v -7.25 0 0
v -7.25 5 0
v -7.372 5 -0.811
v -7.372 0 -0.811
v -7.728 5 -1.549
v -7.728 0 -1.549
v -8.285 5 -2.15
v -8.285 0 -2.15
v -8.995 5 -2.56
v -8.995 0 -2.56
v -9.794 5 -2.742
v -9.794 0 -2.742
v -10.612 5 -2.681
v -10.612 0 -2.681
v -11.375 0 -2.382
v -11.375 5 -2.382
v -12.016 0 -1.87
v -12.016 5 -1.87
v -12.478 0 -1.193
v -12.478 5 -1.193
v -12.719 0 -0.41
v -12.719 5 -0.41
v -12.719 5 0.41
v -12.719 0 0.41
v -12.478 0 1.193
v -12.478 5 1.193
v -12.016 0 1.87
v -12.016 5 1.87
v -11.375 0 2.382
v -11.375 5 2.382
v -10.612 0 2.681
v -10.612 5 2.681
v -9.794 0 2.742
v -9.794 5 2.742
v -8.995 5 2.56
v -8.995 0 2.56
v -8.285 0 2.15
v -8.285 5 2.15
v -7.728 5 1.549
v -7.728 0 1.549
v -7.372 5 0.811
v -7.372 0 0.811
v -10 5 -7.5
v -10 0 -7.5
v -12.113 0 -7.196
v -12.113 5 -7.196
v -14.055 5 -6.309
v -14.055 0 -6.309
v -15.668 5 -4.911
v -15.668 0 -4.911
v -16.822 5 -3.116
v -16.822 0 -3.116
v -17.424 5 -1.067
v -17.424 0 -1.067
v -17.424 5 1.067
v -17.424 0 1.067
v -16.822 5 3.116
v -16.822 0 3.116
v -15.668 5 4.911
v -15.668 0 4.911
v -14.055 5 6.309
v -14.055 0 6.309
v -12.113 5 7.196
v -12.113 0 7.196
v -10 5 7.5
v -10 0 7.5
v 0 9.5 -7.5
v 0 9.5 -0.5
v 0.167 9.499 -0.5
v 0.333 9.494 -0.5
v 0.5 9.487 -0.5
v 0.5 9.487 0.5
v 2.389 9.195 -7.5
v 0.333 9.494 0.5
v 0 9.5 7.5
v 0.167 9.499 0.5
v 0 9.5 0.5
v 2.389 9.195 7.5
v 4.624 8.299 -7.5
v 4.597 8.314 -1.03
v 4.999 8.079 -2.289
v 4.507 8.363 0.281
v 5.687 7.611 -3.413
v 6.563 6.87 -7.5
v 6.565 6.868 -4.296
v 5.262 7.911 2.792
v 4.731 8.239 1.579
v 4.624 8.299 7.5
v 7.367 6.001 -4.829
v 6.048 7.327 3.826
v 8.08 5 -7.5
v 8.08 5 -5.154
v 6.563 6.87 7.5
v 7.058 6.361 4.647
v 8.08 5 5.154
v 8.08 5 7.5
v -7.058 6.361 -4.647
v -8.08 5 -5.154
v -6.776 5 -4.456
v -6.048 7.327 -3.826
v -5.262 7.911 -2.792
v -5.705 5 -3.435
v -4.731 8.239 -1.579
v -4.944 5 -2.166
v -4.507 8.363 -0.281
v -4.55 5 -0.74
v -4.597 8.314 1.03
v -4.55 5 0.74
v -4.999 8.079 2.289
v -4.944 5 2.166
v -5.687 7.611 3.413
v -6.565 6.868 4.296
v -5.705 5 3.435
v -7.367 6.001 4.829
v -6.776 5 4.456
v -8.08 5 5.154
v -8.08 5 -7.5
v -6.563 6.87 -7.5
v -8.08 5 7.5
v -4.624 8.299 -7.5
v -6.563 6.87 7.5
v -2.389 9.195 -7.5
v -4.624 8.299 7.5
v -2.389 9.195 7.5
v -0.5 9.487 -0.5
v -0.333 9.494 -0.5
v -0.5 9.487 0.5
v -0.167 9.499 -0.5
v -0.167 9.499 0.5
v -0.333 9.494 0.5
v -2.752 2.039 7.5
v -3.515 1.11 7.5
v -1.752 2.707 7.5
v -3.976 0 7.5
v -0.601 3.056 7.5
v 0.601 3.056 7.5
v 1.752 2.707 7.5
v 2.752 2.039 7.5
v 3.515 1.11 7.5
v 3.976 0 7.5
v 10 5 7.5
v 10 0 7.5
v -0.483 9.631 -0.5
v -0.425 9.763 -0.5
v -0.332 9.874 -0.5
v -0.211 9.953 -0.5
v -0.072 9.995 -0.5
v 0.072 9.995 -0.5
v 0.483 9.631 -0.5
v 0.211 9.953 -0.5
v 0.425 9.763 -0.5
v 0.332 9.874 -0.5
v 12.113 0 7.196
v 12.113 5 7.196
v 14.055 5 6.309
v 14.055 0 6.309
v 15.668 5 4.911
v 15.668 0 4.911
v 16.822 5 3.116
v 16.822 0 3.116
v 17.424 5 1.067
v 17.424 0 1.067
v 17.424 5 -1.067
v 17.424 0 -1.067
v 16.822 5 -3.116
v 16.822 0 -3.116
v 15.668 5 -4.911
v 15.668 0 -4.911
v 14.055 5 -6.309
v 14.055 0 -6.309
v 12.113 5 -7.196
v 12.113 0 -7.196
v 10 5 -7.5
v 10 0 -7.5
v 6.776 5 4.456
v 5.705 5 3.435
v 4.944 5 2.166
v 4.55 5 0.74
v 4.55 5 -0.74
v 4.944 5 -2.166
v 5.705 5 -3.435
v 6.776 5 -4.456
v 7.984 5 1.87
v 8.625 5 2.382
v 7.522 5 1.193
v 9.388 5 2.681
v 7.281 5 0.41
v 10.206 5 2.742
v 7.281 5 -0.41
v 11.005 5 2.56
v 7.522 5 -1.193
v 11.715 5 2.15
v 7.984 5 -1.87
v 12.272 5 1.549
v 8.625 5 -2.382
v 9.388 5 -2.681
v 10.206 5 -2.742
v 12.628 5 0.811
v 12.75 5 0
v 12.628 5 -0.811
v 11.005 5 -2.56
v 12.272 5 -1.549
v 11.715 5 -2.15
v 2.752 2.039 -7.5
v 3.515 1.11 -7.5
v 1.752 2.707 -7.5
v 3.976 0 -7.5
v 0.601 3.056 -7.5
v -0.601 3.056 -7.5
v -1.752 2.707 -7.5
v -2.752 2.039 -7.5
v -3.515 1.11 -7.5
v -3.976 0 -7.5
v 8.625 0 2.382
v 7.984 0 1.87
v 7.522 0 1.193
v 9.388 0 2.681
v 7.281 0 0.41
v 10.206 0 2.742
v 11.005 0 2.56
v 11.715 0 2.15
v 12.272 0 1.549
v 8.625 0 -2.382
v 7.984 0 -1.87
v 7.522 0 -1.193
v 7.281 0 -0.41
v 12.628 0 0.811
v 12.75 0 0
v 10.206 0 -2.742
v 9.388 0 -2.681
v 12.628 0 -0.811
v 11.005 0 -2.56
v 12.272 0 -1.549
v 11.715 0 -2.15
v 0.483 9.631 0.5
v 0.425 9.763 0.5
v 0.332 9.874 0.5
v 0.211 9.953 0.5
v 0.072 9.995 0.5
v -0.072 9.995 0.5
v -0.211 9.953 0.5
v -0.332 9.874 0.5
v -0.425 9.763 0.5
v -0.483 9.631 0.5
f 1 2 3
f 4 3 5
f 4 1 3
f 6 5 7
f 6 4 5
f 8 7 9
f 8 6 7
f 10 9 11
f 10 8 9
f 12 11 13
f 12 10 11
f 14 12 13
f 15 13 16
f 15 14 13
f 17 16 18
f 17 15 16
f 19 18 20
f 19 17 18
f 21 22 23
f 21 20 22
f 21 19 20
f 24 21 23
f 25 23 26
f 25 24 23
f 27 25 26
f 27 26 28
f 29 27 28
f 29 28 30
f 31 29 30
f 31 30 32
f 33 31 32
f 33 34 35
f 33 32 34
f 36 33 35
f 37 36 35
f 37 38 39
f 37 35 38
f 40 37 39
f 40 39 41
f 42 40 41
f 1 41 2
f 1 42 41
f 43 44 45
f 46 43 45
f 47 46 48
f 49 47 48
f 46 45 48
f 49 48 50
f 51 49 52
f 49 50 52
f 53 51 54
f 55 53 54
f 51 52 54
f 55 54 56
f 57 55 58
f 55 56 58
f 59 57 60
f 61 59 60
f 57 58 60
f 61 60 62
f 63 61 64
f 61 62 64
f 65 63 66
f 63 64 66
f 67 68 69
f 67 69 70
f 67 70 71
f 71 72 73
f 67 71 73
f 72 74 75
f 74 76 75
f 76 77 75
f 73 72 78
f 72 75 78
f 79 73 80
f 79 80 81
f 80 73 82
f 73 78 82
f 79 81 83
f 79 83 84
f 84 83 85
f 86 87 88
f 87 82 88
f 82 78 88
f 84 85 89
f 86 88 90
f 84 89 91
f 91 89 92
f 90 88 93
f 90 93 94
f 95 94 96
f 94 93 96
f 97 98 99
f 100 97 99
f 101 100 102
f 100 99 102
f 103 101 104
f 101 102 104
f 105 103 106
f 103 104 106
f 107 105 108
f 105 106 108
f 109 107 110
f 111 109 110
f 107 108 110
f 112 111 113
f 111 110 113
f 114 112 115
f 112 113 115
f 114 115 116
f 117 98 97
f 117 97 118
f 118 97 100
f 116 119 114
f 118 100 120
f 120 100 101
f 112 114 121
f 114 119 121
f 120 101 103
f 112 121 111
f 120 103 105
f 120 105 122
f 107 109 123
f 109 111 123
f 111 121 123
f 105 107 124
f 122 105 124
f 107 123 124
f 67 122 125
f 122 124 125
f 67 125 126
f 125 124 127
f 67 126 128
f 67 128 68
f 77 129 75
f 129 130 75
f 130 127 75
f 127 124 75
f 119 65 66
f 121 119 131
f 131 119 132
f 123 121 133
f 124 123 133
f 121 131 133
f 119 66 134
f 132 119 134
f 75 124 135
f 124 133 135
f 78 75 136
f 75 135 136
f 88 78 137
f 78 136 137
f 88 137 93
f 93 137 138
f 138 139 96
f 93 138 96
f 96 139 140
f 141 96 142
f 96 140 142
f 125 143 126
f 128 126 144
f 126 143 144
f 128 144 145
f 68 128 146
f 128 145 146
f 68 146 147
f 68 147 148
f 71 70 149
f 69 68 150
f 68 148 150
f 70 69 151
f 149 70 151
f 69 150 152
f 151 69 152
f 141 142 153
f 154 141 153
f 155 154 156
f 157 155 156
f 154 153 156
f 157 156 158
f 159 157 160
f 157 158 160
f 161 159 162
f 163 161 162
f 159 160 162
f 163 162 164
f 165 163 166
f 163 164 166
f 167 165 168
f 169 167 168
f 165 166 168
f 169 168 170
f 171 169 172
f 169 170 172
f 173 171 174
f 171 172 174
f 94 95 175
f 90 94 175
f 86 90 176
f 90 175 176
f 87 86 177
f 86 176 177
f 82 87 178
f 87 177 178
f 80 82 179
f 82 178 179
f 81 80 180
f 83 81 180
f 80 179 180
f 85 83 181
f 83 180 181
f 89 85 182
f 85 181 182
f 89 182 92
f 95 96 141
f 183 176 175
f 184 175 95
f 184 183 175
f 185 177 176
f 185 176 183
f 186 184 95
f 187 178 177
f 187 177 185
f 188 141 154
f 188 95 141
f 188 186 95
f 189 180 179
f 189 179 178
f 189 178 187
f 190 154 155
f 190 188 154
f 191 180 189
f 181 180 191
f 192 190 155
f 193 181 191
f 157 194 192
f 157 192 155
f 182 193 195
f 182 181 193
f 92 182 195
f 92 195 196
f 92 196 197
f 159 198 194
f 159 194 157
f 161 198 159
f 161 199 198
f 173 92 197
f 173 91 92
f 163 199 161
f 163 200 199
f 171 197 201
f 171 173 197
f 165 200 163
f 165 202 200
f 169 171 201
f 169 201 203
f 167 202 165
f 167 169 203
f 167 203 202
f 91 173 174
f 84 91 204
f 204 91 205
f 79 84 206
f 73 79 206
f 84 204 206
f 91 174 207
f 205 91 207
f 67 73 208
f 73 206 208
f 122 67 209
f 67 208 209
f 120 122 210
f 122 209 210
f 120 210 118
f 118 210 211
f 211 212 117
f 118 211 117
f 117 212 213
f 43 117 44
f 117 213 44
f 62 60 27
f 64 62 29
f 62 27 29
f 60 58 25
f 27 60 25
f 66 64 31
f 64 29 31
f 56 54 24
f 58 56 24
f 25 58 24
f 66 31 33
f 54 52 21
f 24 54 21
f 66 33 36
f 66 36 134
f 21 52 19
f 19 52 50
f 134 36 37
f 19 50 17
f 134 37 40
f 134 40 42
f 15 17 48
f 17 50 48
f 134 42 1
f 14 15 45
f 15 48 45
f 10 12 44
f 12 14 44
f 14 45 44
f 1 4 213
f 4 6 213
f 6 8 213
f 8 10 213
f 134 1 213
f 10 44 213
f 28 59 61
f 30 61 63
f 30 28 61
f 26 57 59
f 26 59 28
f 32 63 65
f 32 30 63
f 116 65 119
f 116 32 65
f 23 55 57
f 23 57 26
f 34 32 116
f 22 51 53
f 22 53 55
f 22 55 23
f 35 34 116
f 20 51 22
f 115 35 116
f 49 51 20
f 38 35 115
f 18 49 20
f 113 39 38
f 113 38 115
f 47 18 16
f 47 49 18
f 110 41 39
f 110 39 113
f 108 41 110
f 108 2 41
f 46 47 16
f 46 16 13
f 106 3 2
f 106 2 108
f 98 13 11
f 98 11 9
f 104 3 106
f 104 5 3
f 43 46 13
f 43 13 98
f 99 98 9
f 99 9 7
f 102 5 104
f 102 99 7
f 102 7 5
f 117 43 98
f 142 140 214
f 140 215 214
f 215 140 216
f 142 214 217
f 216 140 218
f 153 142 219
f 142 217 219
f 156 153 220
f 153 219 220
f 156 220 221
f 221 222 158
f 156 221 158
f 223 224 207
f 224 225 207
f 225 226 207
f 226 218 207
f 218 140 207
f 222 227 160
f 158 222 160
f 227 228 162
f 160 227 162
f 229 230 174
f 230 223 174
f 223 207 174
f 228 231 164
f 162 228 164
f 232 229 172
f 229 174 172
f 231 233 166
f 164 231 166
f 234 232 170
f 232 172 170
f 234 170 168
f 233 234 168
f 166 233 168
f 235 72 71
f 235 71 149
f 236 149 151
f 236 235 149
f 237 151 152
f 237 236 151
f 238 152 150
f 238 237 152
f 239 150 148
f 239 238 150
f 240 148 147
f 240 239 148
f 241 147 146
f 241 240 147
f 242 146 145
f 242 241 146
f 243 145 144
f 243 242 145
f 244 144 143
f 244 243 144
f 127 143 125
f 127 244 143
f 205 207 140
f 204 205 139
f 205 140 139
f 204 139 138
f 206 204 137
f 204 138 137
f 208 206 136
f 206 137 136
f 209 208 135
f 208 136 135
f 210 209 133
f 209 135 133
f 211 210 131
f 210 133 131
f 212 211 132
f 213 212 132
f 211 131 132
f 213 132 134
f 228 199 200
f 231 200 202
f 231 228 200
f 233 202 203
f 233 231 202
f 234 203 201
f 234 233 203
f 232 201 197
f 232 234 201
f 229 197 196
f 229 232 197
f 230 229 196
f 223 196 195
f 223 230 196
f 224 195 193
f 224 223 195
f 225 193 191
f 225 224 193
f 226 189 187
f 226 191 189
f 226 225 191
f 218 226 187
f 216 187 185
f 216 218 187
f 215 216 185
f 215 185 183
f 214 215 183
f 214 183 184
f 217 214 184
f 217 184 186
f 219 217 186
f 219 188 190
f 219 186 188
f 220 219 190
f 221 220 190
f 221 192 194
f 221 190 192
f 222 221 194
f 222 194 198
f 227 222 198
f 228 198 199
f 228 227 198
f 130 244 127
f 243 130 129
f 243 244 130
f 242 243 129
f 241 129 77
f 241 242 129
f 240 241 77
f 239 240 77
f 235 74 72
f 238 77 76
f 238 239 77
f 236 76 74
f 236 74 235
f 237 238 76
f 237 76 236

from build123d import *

# Parameters (mm, degrees)
BOSS_EXTRUDE1_DEPTH = 9.5
SKETCH1_3_R         = 2.75
BOSS_EXTRUDE2_DEPTH = 5
CUT_EXTRUDE2_DEPTH  = 25.929901725
BOSS_EXTRUDE3_DEPTH = 0.5


with BuildPart() as part:
    # Sketch1 → Boss-Extrude1 (new body)
    with BuildSketch(Plane(origin=(0, 0, 0), x_dir=(1, 0, 0), z_dir=(0, 1, 0))):
        with BuildLine():
            Line((8.08, 7.5), (-8.08, 7.5))
            Line((-8.08, 7.5), (-8.08, 5.153988747))
            ThreePointArc((-8.08, 5.153988747), (-4.5, 0), (-8.08, -5.153988747))
            Line((-8.08, -5.153988747), (-8.08, -7.5))
            Line((-8.08, -7.5), (8.08, -7.5))
            Line((8.08, -7.5), (8.08, -5.153988747))
            ThreePointArc((8.08, -5.153988747), (4.5, 0), (8.08, 5.153988747))
            Line((8.08, 5.153988747), (8.08, 7.5))
        make_face()
    extrude(amount=BOSS_EXTRUDE1_DEPTH)

    # Sketch1<3> → Boss-Extrude2 (add)
    # profile 1 of 2: a face of its own
    with BuildSketch(Plane(origin=(0, 0, 0), x_dir=(1, 0, 0), z_dir=(0, 1, 0))):
        with BuildLine():
            Line((-8.08, 5.153988747), (-8.08, 7.5))
            Line((-8.08, 7.5), (-10, 7.5))
            ThreePointArc((-10, 7.5), (-17.5, 0), (-10, -7.5))
            Line((-10, -7.5), (-8.08, -7.5))
            Line((-8.08, -7.5), (-8.08, -5.153988747))
            ThreePointArc((-8.08, -5.153988747), (-4.5, 0), (-8.08, 5.153988747))
        make_face()
        with Locations((-10, 0)):
            Circle(SKETCH1_3_R, mode=Mode.SUBTRACT)
    # profile 2 of 2: a face of its own
    with BuildSketch(Plane(origin=(0, 0, 0), x_dir=(1, 0, 0), z_dir=(0, 1, 0))):
        with BuildLine():
            Line((10, 7.5), (8.08, 7.5))
            Line((8.08, 7.5), (8.08, 5.153988747))
            ThreePointArc((8.08, 5.153988747), (4.5, 0), (8.08, -5.153988747))
            Line((8.08, -5.153988747), (8.08, -7.5))
            Line((8.08, -7.5), (10, -7.5))
            ThreePointArc((10, -7.5), (17.5, 0), (10, 7.5))
        make_face()
        with Locations((10, 0)):
            Circle(SKETCH1_3_R, mode=Mode.SUBTRACT)
    extrude(amount=BOSS_EXTRUDE2_DEPTH)

    # Sketch3 → Cut-Extrude2 (cut, through all)
    with BuildSketch(Plane.XY.offset(7.5)):
        with BuildLine():
            Line((1.6e-08, 9.5), (-8.08, 9.5))
            Line((-8.08, 9.5), (-8.08, 5))
            ThreePointArc((-8.08, 5), (-4.624294534, 8.299133313), (1.6e-08, 9.5))
        make_face()
        with BuildLine():
            Line((8.08, 9.5), (1.6e-08, 9.5))
            ThreePointArc((1.6e-08, 9.5), (4.624294548, 8.299133305), (8.08, 5))
            Line((8.08, 5), (8.08, 9.5))
        make_face()
        with BuildLine():
            Line((-3.97617907, 0), (3.97617907, 0))
            ThreePointArc((3.97617907, 0), (0, 3.1), (-3.97617907, 0))
        make_face()
    extrude(amount=-CUT_EXTRUDE2_DEPTH, mode=Mode.SUBTRACT)

    # Sketch7 → Boss-Extrude3 (add, symmetric)
    with BuildSketch(Plane.XY):
        with BuildLine():
            ThreePointArc((-0.499826987, 9.486847705), (0, 9.5), (0.499826987, 9.486847705))
            ThreePointArc((0.499826987, 9.486847705), (0, 10), (-0.499826987, 9.486847705))
        make_face()
    extrude(amount=BOSS_EXTRUDE3_DEPTH, both=True)


solid = part.part
